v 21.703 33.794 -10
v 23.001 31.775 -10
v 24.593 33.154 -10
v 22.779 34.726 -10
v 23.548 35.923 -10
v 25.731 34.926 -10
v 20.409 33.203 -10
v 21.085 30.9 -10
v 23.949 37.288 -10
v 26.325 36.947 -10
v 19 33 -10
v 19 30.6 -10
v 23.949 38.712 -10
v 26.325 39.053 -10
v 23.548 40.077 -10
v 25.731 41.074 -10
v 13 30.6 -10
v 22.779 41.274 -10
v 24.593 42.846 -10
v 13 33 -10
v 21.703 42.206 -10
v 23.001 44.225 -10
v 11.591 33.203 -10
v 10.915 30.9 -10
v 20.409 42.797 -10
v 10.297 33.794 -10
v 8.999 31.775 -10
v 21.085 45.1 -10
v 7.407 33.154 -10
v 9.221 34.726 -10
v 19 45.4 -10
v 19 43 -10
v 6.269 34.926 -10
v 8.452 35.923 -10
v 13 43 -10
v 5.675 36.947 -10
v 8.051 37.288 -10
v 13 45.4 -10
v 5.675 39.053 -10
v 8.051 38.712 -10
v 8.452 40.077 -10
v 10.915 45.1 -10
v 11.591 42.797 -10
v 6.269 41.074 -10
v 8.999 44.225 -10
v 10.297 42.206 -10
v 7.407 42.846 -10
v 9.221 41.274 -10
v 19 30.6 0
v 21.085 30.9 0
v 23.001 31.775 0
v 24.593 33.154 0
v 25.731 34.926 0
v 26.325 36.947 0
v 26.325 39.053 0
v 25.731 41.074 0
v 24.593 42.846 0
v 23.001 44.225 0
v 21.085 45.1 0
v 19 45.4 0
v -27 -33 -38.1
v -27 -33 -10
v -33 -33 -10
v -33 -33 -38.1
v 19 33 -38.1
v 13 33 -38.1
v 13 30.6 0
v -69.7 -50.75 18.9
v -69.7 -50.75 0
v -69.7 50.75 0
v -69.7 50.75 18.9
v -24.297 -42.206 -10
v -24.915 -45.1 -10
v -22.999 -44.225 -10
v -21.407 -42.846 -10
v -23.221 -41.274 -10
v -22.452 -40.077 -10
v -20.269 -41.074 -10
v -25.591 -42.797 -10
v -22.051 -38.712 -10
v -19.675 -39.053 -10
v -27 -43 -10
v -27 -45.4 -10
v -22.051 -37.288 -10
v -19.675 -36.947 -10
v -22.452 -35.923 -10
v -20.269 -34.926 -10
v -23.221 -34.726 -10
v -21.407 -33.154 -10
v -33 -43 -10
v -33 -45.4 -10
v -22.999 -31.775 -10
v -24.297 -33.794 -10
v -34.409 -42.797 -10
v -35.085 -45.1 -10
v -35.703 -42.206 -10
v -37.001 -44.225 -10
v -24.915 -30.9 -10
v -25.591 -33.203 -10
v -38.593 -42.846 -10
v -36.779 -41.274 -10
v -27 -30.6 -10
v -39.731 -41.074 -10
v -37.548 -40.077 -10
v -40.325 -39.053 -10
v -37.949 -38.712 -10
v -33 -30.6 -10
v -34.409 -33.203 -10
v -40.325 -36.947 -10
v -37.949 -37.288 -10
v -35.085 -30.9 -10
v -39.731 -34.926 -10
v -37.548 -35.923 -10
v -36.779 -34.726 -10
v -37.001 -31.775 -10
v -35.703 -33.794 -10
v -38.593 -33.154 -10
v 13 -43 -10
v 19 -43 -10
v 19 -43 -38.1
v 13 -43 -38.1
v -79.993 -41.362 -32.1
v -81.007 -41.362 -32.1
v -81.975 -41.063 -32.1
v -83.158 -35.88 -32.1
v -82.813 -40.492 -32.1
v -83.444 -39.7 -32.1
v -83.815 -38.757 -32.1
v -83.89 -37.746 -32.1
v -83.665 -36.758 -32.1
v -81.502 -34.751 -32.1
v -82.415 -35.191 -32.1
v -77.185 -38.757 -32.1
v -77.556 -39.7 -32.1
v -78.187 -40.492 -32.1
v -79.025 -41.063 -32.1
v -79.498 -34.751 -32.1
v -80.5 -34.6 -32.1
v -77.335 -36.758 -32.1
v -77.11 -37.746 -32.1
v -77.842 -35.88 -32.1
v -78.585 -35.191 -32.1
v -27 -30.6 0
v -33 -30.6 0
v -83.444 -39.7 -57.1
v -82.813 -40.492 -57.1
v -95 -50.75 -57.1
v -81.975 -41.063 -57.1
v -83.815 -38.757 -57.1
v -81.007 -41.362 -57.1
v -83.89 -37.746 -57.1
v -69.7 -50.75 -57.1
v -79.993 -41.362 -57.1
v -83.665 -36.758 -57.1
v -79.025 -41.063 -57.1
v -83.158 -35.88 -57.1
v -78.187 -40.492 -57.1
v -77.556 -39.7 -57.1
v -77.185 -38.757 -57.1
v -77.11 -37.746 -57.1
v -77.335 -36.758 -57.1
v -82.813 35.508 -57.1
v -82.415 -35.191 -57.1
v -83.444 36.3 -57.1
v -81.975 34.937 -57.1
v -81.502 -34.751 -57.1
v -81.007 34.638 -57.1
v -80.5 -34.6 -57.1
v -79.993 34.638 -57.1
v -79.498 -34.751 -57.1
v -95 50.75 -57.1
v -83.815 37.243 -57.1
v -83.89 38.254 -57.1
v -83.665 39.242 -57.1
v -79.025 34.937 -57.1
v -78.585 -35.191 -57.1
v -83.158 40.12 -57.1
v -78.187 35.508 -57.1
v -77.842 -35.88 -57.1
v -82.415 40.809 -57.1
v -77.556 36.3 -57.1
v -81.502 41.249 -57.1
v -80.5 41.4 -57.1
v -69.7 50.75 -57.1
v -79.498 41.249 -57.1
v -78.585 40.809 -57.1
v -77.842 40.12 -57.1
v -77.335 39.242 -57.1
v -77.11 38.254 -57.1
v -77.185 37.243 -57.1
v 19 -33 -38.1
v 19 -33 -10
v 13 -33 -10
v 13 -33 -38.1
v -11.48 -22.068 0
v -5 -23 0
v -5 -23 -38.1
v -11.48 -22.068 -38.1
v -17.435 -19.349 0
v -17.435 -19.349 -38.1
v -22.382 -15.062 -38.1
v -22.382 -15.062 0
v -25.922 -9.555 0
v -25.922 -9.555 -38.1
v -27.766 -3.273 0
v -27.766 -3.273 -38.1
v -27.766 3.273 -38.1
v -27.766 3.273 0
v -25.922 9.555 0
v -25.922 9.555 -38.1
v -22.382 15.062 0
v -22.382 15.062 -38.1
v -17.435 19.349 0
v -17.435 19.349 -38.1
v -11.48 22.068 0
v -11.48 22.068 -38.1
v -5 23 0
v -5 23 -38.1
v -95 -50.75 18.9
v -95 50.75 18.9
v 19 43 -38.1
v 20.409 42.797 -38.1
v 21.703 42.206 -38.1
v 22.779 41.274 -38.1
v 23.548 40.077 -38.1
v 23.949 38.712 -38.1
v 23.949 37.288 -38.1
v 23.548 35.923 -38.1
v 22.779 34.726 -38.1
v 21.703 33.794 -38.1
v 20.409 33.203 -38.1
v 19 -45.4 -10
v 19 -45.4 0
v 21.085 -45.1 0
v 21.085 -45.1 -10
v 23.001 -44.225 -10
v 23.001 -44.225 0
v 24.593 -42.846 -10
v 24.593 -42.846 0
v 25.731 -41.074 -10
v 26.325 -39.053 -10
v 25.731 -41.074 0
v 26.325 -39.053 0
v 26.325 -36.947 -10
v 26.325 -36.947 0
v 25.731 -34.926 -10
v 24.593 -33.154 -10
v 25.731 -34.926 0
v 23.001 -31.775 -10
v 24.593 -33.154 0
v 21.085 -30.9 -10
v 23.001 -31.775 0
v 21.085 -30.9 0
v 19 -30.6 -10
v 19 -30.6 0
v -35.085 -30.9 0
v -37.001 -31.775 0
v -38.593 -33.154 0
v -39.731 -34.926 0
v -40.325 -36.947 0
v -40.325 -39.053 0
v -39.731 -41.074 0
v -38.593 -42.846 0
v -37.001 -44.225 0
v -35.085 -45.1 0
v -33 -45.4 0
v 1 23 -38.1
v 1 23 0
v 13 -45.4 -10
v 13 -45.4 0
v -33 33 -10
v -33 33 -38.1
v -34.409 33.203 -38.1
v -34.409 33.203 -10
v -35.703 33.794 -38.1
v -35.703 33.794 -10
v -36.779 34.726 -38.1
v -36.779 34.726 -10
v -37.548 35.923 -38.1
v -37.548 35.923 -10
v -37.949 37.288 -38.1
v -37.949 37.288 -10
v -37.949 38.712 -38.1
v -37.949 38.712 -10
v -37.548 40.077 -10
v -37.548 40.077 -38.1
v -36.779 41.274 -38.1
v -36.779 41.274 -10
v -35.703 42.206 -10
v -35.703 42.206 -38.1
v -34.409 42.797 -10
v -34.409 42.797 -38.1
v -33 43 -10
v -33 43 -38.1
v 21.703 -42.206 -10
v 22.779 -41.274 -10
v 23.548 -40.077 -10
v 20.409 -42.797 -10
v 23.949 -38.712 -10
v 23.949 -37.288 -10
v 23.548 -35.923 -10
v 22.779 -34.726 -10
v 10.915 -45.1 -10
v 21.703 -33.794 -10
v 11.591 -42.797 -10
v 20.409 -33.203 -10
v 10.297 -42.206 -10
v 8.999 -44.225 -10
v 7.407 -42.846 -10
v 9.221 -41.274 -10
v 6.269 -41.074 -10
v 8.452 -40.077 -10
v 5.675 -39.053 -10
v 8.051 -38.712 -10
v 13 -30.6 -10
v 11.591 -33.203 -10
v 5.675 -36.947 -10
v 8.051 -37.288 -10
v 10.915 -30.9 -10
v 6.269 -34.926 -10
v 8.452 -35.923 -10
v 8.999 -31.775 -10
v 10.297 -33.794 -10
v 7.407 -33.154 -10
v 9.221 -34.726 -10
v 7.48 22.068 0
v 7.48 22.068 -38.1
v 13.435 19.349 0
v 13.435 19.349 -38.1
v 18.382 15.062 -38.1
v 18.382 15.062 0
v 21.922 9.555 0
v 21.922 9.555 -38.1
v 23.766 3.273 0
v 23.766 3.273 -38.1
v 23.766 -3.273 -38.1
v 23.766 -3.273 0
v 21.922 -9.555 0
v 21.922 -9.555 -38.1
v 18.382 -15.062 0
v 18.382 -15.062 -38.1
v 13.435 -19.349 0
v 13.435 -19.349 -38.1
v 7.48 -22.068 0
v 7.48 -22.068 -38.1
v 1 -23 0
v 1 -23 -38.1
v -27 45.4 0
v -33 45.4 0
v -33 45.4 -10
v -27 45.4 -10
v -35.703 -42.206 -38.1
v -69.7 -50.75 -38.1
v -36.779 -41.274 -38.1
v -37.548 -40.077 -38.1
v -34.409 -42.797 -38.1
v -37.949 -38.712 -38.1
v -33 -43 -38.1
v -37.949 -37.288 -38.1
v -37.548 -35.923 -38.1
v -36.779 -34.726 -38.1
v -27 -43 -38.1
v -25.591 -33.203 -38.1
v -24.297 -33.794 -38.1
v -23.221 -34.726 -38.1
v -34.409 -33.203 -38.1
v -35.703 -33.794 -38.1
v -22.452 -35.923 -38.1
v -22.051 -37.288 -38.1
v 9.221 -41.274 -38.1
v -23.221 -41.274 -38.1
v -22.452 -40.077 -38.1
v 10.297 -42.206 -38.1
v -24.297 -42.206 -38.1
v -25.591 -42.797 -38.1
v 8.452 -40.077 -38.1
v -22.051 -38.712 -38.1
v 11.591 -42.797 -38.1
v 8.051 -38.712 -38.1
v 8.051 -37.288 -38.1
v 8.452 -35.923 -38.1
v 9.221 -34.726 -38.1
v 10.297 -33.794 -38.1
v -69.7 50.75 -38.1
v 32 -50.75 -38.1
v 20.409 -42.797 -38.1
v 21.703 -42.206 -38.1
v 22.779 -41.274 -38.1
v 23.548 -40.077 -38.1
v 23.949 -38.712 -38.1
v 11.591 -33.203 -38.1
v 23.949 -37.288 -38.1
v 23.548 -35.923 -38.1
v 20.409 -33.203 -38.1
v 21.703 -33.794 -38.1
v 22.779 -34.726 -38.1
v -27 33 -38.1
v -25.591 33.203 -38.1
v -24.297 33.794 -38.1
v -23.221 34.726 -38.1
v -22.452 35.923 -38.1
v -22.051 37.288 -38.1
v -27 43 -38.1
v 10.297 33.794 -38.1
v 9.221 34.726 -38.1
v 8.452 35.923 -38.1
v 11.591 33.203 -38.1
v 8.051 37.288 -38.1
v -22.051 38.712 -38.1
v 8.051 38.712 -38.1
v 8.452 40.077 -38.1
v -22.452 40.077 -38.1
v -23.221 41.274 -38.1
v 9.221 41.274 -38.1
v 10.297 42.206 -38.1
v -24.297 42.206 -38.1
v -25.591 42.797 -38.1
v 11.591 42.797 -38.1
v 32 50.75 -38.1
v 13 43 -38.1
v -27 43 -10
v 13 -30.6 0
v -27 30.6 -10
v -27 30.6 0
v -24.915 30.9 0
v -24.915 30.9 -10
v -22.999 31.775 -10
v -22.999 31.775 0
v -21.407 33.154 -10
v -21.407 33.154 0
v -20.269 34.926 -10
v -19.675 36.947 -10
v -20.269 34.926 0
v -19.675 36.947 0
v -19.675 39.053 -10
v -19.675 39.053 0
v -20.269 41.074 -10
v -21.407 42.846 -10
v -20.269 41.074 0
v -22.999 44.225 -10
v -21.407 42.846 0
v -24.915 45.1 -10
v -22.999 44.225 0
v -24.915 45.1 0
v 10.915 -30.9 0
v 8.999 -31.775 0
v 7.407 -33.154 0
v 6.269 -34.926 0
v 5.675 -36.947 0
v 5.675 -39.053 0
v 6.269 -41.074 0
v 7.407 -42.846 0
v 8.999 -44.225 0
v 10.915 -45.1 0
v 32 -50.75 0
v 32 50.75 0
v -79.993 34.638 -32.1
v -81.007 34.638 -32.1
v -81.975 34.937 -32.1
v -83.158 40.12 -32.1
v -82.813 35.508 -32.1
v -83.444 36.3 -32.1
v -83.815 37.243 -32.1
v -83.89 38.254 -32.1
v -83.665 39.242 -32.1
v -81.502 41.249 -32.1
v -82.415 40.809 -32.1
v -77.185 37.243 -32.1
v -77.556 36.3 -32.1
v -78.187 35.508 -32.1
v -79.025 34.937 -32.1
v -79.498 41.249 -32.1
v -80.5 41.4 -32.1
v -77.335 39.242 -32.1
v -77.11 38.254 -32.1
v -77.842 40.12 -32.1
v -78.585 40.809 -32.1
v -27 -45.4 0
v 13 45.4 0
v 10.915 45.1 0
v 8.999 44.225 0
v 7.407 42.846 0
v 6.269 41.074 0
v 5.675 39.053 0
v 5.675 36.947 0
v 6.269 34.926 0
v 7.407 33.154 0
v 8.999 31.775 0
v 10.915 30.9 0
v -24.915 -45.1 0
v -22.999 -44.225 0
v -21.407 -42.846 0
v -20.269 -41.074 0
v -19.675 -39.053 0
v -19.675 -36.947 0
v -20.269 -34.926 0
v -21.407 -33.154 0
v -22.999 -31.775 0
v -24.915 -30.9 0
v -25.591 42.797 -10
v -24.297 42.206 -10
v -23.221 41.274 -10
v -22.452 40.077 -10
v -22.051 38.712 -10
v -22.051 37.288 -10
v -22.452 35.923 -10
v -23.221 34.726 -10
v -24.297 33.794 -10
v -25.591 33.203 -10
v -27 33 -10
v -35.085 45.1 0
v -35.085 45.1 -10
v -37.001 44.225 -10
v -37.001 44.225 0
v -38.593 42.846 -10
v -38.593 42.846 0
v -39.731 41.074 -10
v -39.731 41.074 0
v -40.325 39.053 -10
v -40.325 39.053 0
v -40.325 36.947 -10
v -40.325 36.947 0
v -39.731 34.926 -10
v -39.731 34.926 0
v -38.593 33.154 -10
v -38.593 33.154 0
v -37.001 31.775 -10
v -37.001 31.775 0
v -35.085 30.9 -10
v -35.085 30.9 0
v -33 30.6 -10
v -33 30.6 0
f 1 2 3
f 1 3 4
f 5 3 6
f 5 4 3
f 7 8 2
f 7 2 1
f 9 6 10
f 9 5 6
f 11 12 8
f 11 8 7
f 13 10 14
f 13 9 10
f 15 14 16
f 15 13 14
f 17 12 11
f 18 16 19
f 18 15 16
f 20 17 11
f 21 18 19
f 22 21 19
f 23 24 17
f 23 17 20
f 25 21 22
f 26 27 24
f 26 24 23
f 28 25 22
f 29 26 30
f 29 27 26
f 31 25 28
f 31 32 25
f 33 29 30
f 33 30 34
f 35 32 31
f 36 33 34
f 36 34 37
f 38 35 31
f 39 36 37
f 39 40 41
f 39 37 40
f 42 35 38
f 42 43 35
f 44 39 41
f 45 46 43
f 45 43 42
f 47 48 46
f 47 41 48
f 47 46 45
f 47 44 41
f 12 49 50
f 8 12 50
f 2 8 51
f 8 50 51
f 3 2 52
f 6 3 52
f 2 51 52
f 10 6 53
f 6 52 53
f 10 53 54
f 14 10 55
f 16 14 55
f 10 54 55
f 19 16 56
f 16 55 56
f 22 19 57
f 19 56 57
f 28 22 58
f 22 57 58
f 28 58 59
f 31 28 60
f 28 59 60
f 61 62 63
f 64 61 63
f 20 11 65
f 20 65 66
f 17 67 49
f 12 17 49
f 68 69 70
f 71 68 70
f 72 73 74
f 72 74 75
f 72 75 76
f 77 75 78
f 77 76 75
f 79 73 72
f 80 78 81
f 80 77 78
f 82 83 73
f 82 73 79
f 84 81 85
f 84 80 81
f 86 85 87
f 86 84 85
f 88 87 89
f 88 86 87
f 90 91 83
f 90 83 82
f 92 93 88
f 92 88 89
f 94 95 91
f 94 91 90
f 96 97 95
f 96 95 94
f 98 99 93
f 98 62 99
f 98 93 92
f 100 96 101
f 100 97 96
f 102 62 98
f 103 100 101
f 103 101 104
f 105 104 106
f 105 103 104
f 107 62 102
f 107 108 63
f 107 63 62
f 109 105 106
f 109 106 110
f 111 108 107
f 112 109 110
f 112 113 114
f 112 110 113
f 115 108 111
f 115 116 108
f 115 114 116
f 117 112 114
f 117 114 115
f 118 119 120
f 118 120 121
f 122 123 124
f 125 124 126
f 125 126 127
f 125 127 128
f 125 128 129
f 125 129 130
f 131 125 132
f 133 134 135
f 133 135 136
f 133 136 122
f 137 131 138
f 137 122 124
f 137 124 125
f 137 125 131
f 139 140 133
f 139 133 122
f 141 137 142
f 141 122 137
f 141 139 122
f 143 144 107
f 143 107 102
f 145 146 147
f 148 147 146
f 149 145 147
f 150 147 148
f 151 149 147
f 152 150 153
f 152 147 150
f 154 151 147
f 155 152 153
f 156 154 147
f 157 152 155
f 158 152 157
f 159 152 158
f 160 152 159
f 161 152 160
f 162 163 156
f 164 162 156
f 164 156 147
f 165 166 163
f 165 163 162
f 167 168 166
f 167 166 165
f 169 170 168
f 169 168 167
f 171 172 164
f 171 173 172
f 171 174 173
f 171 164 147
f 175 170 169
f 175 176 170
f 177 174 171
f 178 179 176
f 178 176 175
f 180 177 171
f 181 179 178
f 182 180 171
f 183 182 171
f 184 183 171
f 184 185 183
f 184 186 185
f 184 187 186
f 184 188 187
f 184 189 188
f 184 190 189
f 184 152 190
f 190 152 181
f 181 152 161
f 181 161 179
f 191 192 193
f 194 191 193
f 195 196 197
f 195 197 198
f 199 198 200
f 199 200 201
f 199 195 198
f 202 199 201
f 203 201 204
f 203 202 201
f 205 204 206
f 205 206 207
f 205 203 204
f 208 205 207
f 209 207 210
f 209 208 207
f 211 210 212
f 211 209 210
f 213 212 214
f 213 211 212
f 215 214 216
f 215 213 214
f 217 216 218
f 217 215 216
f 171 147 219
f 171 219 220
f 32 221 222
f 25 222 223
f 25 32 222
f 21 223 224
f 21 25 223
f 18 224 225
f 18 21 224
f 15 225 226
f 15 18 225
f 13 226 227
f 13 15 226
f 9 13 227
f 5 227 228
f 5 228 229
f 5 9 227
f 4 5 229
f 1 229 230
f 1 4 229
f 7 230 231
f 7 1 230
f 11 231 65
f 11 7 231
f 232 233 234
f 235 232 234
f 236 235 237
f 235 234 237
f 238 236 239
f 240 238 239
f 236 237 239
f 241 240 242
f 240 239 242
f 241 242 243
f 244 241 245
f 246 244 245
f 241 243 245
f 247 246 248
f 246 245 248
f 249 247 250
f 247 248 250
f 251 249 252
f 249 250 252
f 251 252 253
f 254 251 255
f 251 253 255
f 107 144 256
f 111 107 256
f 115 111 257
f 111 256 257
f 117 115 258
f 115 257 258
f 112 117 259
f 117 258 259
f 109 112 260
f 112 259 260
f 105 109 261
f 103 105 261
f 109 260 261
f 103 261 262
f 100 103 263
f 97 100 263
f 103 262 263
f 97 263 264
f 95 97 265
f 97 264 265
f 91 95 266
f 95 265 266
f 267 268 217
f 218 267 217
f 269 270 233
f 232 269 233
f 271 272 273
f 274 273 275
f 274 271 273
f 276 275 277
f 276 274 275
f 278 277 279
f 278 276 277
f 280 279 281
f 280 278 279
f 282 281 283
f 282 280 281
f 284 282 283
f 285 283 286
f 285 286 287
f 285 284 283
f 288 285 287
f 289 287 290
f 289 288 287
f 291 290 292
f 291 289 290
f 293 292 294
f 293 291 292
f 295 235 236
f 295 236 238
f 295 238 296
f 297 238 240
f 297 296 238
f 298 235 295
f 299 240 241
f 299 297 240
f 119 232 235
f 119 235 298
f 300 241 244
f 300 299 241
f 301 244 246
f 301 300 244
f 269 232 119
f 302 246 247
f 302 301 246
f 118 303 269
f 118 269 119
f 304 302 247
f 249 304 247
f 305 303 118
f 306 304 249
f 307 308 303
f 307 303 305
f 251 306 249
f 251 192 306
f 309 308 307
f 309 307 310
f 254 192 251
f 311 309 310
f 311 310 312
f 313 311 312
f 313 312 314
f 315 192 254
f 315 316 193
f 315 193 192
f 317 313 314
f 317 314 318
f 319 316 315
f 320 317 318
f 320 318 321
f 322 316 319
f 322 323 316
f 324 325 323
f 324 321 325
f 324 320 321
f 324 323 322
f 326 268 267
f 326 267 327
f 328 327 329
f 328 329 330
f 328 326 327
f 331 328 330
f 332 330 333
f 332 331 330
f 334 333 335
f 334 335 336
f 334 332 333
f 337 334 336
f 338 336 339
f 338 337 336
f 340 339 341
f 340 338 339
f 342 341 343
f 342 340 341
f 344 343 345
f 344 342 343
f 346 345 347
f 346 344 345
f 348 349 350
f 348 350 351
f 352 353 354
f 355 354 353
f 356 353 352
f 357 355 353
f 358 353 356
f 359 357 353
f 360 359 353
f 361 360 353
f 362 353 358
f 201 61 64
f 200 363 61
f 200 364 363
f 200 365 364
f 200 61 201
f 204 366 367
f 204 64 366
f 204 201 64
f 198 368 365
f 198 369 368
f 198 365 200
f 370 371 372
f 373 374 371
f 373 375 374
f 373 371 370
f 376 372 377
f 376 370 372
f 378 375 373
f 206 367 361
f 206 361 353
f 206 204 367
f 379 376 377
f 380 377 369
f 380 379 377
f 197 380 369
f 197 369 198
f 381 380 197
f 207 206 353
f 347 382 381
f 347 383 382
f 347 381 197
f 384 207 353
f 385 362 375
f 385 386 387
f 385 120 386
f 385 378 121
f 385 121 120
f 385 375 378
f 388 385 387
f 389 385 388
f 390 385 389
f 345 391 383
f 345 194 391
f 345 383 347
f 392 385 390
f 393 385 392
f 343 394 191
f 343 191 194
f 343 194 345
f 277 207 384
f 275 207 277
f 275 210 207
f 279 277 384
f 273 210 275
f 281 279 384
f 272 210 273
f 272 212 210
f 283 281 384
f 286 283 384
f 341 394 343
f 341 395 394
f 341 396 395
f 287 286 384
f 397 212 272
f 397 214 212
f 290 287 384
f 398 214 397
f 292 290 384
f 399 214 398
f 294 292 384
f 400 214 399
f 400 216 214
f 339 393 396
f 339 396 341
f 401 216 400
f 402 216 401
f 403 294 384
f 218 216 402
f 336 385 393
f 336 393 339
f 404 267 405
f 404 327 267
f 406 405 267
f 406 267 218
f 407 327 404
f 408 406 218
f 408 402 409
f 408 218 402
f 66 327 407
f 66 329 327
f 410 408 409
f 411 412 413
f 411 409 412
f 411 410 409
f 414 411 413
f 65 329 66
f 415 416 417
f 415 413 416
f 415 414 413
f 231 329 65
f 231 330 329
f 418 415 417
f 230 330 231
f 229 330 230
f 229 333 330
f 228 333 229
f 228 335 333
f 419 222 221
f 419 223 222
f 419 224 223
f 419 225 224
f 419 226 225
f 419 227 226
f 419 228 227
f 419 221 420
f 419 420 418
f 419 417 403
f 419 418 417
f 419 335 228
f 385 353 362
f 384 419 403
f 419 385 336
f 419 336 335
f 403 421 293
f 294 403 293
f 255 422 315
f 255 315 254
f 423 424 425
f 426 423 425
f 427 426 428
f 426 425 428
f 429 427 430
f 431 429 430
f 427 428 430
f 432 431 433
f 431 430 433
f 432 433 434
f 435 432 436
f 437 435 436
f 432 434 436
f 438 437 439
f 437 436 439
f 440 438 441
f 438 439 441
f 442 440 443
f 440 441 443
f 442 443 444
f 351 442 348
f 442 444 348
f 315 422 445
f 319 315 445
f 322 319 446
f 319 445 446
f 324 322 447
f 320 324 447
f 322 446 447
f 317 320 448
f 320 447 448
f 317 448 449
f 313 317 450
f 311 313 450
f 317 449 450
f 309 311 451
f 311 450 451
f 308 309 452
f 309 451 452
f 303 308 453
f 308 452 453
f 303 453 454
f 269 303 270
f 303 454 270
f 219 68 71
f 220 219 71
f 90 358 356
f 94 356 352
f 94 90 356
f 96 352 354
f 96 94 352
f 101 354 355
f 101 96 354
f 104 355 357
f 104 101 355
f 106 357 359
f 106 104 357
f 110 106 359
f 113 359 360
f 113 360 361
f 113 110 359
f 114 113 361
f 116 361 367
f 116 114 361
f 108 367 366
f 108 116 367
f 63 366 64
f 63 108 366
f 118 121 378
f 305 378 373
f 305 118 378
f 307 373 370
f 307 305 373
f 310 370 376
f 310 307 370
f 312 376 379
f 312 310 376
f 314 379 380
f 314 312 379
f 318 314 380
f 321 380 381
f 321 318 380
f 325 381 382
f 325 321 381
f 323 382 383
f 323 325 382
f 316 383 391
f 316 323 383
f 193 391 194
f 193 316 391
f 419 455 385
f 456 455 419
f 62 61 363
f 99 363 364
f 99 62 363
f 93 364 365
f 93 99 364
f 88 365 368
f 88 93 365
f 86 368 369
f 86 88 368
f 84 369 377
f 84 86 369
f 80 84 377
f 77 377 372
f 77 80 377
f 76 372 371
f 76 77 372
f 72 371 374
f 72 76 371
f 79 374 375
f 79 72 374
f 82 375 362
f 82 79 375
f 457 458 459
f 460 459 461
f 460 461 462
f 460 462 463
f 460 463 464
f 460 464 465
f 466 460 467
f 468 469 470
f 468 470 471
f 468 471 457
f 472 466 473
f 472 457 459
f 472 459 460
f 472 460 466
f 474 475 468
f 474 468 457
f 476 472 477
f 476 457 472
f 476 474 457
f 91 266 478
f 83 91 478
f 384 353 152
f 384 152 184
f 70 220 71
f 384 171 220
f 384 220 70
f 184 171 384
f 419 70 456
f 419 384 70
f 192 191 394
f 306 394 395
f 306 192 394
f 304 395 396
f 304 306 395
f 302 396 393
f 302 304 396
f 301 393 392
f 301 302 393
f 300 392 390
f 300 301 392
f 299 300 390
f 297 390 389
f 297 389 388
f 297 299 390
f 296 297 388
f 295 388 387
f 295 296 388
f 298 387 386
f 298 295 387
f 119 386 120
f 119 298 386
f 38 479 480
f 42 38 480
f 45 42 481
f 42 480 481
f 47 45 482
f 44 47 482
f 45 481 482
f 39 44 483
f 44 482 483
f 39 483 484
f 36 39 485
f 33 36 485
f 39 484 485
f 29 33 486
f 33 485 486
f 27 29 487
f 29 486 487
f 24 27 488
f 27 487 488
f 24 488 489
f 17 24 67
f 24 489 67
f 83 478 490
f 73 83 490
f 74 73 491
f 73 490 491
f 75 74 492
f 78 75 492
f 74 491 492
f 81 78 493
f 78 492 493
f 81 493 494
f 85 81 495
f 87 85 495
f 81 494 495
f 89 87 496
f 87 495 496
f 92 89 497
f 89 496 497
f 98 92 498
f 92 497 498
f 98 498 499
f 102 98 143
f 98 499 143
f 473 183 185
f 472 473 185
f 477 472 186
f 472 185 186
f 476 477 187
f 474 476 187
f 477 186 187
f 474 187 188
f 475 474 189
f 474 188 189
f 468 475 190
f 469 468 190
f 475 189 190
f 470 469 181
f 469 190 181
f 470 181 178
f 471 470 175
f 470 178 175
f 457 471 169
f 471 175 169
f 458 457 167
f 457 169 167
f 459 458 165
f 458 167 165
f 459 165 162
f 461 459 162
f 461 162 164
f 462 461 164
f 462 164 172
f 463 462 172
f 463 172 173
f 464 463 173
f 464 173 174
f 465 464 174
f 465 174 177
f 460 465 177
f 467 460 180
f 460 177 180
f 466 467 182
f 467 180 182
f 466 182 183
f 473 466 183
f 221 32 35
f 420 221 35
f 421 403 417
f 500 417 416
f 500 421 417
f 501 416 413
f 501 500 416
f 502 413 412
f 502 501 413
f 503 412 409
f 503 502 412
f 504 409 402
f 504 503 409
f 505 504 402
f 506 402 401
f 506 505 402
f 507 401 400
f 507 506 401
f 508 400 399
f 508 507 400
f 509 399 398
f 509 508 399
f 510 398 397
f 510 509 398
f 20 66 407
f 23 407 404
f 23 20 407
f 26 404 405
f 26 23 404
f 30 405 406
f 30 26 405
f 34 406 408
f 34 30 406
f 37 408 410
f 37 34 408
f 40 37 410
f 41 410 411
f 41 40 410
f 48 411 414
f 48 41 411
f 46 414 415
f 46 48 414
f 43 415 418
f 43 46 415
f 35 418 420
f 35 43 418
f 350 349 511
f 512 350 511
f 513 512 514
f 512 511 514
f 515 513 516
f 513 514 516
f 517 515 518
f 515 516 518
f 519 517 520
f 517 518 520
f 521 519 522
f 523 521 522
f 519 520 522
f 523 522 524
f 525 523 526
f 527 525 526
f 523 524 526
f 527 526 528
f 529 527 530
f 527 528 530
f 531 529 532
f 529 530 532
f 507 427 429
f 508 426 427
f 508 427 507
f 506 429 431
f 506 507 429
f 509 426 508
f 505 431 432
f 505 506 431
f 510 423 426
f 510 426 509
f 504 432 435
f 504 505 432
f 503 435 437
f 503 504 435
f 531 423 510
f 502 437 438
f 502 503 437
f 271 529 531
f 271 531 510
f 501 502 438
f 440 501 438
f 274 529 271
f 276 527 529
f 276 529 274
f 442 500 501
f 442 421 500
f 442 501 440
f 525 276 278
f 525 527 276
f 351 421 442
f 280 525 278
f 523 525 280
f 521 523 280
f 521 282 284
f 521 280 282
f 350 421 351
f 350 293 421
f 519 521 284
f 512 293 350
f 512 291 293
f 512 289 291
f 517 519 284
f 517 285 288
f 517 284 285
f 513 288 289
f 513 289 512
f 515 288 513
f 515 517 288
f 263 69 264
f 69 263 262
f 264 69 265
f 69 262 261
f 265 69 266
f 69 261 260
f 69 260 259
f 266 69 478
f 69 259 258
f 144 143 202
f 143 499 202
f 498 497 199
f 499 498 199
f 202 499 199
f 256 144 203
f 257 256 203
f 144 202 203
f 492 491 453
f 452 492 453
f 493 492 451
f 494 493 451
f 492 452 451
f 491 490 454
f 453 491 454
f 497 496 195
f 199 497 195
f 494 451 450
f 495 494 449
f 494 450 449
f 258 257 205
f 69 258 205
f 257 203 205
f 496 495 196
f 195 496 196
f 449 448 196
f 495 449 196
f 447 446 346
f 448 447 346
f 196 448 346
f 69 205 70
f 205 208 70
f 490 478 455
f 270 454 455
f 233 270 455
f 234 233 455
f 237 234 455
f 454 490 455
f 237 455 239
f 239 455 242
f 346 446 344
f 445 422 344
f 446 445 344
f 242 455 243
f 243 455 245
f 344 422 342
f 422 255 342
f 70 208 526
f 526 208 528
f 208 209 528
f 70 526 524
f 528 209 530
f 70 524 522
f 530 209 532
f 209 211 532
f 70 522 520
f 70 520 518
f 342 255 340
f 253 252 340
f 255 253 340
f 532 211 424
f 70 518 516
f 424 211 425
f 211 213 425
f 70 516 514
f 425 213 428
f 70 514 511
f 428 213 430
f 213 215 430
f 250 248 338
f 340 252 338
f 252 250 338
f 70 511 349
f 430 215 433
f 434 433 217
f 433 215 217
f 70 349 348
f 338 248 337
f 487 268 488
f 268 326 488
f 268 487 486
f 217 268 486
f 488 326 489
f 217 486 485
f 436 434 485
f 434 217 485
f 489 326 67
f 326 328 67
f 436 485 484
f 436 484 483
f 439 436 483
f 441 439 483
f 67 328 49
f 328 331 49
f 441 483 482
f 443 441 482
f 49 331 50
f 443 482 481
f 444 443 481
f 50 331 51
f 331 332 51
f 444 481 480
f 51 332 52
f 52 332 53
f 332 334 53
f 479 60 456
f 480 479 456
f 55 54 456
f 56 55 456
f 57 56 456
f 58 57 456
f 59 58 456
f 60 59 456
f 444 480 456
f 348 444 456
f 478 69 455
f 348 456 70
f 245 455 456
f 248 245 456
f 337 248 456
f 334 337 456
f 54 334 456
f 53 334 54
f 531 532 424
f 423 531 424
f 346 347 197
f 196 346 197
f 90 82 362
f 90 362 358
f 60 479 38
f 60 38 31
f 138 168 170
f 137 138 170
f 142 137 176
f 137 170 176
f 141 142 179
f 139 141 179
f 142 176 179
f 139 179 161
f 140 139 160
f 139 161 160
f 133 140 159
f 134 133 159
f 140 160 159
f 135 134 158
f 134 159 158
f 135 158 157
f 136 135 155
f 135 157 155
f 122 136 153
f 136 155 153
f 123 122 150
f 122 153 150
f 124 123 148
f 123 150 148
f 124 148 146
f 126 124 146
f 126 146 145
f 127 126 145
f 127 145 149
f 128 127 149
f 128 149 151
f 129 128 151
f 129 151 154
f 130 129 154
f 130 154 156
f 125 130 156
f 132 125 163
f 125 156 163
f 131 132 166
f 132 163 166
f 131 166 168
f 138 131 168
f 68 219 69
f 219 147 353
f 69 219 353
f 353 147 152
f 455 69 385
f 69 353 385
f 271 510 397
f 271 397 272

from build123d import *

# Parameters (mm, degrees)
SKETCH_W              = 101.5
SKETCH_H              = 127
PAD_DEPTH             = 38.1
SKETCH001_W           = 101.5
SKETCH001_H           = 25.3
PAD001_DEPTH          = 19
PAD001_DEPTH_BACK     = 57
SKETCH002_R           = 3.4
POCKET_DEPTH          = 25
POCKET001_DEPTH       = 10
CLONE_ROLL_ANGLE      = 180
CLONE_PLACEMENT_ANGLE = 90


with BuildPart() as part:
    # Sketch → Pad (new body)
    with BuildSketch(Plane.XY):
        with Locations((0, -31.5)):
            Rectangle(SKETCH_W, SKETCH_H)
        with BuildLine():
            ThreePointArc((23, 1), (0, 24), (-23, 1))
            Line((-23, 1), (-23, -5))
            ThreePointArc((-23, -5), (0, -28), (23, -5))
            Line((23, 1), (23, -5))
        make_face(mode=Mode.SUBTRACT)
        with BuildLine():
            ThreePointArc((-33, 19), (-38, 24), (-43, 19))
            Line((-43, 19), (-43, 13))
            ThreePointArc((-43, 13), (-38, 8), (-33, 13))
            Line((-33, 19), (-33, 13))
        make_face(mode=Mode.SUBTRACT)
        with BuildLine():
            ThreePointArc((43, 19), (38, 24), (33, 19))
            Line((33, 19), (33, 13))
            ThreePointArc((33, 13), (38, 8), (43, 13))
            Line((43, 19), (43, 13))
        make_face(mode=Mode.SUBTRACT)
        with BuildLine():
            ThreePointArc((43, -27), (38, -22), (33, -27))
            Line((33, -27), (33, -33))
            ThreePointArc((33, -33), (38, -38), (43, -33))
            Line((43, -27), (43, -33))
        make_face(mode=Mode.SUBTRACT)
        with BuildLine():
            ThreePointArc((-33, -27), (-38, -22), (-43, -27))
            Line((-43, -27), (-43, -33))
            ThreePointArc((-43, -33), (-38, -38), (-33, -33))
            Line((-33, -27), (-33, -33))
        make_face(mode=Mode.SUBTRACT)
    extrude(amount=PAD_DEPTH)

    # Sketch001 (on Face26 of Pad) → Pad001 (join, two sides)
    with BuildSketch(Plane.XY.offset(38.1)) as pad001_sk:
        with Locations((0, -82.35)):
            Rectangle(SKETCH001_W, SKETCH001_H)
    extrude(amount=PAD001_DEPTH)
    extrude(pad001_sk.sketch, amount=-PAD001_DEPTH_BACK)

    # Sketch002 (on Face36 of Pad001) → Pocket (cut)
    with BuildSketch(Plane.XY.offset(57.1)):
        with Locations((-38, -80.5)):
            Circle(SKETCH002_R)
        with Locations((38, -80.5)):
            Circle(SKETCH002_R)
    extrude(amount=-POCKET_DEPTH, mode=Mode.SUBTRACT)

    # Sketch003 (on Face4 of Pocket) → Pocket001 (cut)
    with BuildSketch(Plane(origin=(0, 0, 0), x_dir=(1, 0, 0), z_dir=(0, 0, -1))):
        with BuildLine():
            ThreePointArc((-30.6, 33), (-38, 40.4), (-45.4, 33))
            Line((-45.4, 33), (-45.4, 27))
            ThreePointArc((-45.4, 27), (-38, 19.6), (-30.6, 27))
            Line((-30.6, 33), (-30.6, 27))
        make_face()
        with BuildLine():
            ThreePointArc((45.4, 33), (38, 40.4), (30.6, 33))
            Line((30.6, 33), (30.6, 27))
            ThreePointArc((30.6, 27), (38, 19.6), (45.4, 27))
            Line((45.4, 33), (45.4, 27))
        make_face()
        with BuildLine():
            ThreePointArc((45.4, -13), (38, -5.6), (30.6, -13))
            Line((30.6, -13), (30.6, -19))
            ThreePointArc((30.6, -19), (38, -26.4), (45.4, -19))
            Line((45.4, -13), (45.4, -19))
        make_face()
        with BuildLine():
            ThreePointArc((-30.6, -13), (-38, -5.6), (-45.4, -13))
            Line((-45.4, -13), (-45.4, -19))
            ThreePointArc((-45.4, -19), (-38, -26.4), (-30.6, -19))
            Line((-30.6, -13), (-30.6, -19))
        make_face()
    extrude(amount=-POCKET001_DEPTH, mode=Mode.SUBTRACT)


with BuildPart() as part_1:
    # Clone roll: moved
    add(part.part.rotate(Axis((0, 0, 0), (1, 0, 0)), CLONE_ROLL_ANGLE))


with BuildPart() as part_2:
    # Clone placement: moved
    add(part_1.part.rotate(Axis((0, 0, 0), (0, 0, 1)), CLONE_PLACEMENT_ANGLE))


solid = part_2.part
